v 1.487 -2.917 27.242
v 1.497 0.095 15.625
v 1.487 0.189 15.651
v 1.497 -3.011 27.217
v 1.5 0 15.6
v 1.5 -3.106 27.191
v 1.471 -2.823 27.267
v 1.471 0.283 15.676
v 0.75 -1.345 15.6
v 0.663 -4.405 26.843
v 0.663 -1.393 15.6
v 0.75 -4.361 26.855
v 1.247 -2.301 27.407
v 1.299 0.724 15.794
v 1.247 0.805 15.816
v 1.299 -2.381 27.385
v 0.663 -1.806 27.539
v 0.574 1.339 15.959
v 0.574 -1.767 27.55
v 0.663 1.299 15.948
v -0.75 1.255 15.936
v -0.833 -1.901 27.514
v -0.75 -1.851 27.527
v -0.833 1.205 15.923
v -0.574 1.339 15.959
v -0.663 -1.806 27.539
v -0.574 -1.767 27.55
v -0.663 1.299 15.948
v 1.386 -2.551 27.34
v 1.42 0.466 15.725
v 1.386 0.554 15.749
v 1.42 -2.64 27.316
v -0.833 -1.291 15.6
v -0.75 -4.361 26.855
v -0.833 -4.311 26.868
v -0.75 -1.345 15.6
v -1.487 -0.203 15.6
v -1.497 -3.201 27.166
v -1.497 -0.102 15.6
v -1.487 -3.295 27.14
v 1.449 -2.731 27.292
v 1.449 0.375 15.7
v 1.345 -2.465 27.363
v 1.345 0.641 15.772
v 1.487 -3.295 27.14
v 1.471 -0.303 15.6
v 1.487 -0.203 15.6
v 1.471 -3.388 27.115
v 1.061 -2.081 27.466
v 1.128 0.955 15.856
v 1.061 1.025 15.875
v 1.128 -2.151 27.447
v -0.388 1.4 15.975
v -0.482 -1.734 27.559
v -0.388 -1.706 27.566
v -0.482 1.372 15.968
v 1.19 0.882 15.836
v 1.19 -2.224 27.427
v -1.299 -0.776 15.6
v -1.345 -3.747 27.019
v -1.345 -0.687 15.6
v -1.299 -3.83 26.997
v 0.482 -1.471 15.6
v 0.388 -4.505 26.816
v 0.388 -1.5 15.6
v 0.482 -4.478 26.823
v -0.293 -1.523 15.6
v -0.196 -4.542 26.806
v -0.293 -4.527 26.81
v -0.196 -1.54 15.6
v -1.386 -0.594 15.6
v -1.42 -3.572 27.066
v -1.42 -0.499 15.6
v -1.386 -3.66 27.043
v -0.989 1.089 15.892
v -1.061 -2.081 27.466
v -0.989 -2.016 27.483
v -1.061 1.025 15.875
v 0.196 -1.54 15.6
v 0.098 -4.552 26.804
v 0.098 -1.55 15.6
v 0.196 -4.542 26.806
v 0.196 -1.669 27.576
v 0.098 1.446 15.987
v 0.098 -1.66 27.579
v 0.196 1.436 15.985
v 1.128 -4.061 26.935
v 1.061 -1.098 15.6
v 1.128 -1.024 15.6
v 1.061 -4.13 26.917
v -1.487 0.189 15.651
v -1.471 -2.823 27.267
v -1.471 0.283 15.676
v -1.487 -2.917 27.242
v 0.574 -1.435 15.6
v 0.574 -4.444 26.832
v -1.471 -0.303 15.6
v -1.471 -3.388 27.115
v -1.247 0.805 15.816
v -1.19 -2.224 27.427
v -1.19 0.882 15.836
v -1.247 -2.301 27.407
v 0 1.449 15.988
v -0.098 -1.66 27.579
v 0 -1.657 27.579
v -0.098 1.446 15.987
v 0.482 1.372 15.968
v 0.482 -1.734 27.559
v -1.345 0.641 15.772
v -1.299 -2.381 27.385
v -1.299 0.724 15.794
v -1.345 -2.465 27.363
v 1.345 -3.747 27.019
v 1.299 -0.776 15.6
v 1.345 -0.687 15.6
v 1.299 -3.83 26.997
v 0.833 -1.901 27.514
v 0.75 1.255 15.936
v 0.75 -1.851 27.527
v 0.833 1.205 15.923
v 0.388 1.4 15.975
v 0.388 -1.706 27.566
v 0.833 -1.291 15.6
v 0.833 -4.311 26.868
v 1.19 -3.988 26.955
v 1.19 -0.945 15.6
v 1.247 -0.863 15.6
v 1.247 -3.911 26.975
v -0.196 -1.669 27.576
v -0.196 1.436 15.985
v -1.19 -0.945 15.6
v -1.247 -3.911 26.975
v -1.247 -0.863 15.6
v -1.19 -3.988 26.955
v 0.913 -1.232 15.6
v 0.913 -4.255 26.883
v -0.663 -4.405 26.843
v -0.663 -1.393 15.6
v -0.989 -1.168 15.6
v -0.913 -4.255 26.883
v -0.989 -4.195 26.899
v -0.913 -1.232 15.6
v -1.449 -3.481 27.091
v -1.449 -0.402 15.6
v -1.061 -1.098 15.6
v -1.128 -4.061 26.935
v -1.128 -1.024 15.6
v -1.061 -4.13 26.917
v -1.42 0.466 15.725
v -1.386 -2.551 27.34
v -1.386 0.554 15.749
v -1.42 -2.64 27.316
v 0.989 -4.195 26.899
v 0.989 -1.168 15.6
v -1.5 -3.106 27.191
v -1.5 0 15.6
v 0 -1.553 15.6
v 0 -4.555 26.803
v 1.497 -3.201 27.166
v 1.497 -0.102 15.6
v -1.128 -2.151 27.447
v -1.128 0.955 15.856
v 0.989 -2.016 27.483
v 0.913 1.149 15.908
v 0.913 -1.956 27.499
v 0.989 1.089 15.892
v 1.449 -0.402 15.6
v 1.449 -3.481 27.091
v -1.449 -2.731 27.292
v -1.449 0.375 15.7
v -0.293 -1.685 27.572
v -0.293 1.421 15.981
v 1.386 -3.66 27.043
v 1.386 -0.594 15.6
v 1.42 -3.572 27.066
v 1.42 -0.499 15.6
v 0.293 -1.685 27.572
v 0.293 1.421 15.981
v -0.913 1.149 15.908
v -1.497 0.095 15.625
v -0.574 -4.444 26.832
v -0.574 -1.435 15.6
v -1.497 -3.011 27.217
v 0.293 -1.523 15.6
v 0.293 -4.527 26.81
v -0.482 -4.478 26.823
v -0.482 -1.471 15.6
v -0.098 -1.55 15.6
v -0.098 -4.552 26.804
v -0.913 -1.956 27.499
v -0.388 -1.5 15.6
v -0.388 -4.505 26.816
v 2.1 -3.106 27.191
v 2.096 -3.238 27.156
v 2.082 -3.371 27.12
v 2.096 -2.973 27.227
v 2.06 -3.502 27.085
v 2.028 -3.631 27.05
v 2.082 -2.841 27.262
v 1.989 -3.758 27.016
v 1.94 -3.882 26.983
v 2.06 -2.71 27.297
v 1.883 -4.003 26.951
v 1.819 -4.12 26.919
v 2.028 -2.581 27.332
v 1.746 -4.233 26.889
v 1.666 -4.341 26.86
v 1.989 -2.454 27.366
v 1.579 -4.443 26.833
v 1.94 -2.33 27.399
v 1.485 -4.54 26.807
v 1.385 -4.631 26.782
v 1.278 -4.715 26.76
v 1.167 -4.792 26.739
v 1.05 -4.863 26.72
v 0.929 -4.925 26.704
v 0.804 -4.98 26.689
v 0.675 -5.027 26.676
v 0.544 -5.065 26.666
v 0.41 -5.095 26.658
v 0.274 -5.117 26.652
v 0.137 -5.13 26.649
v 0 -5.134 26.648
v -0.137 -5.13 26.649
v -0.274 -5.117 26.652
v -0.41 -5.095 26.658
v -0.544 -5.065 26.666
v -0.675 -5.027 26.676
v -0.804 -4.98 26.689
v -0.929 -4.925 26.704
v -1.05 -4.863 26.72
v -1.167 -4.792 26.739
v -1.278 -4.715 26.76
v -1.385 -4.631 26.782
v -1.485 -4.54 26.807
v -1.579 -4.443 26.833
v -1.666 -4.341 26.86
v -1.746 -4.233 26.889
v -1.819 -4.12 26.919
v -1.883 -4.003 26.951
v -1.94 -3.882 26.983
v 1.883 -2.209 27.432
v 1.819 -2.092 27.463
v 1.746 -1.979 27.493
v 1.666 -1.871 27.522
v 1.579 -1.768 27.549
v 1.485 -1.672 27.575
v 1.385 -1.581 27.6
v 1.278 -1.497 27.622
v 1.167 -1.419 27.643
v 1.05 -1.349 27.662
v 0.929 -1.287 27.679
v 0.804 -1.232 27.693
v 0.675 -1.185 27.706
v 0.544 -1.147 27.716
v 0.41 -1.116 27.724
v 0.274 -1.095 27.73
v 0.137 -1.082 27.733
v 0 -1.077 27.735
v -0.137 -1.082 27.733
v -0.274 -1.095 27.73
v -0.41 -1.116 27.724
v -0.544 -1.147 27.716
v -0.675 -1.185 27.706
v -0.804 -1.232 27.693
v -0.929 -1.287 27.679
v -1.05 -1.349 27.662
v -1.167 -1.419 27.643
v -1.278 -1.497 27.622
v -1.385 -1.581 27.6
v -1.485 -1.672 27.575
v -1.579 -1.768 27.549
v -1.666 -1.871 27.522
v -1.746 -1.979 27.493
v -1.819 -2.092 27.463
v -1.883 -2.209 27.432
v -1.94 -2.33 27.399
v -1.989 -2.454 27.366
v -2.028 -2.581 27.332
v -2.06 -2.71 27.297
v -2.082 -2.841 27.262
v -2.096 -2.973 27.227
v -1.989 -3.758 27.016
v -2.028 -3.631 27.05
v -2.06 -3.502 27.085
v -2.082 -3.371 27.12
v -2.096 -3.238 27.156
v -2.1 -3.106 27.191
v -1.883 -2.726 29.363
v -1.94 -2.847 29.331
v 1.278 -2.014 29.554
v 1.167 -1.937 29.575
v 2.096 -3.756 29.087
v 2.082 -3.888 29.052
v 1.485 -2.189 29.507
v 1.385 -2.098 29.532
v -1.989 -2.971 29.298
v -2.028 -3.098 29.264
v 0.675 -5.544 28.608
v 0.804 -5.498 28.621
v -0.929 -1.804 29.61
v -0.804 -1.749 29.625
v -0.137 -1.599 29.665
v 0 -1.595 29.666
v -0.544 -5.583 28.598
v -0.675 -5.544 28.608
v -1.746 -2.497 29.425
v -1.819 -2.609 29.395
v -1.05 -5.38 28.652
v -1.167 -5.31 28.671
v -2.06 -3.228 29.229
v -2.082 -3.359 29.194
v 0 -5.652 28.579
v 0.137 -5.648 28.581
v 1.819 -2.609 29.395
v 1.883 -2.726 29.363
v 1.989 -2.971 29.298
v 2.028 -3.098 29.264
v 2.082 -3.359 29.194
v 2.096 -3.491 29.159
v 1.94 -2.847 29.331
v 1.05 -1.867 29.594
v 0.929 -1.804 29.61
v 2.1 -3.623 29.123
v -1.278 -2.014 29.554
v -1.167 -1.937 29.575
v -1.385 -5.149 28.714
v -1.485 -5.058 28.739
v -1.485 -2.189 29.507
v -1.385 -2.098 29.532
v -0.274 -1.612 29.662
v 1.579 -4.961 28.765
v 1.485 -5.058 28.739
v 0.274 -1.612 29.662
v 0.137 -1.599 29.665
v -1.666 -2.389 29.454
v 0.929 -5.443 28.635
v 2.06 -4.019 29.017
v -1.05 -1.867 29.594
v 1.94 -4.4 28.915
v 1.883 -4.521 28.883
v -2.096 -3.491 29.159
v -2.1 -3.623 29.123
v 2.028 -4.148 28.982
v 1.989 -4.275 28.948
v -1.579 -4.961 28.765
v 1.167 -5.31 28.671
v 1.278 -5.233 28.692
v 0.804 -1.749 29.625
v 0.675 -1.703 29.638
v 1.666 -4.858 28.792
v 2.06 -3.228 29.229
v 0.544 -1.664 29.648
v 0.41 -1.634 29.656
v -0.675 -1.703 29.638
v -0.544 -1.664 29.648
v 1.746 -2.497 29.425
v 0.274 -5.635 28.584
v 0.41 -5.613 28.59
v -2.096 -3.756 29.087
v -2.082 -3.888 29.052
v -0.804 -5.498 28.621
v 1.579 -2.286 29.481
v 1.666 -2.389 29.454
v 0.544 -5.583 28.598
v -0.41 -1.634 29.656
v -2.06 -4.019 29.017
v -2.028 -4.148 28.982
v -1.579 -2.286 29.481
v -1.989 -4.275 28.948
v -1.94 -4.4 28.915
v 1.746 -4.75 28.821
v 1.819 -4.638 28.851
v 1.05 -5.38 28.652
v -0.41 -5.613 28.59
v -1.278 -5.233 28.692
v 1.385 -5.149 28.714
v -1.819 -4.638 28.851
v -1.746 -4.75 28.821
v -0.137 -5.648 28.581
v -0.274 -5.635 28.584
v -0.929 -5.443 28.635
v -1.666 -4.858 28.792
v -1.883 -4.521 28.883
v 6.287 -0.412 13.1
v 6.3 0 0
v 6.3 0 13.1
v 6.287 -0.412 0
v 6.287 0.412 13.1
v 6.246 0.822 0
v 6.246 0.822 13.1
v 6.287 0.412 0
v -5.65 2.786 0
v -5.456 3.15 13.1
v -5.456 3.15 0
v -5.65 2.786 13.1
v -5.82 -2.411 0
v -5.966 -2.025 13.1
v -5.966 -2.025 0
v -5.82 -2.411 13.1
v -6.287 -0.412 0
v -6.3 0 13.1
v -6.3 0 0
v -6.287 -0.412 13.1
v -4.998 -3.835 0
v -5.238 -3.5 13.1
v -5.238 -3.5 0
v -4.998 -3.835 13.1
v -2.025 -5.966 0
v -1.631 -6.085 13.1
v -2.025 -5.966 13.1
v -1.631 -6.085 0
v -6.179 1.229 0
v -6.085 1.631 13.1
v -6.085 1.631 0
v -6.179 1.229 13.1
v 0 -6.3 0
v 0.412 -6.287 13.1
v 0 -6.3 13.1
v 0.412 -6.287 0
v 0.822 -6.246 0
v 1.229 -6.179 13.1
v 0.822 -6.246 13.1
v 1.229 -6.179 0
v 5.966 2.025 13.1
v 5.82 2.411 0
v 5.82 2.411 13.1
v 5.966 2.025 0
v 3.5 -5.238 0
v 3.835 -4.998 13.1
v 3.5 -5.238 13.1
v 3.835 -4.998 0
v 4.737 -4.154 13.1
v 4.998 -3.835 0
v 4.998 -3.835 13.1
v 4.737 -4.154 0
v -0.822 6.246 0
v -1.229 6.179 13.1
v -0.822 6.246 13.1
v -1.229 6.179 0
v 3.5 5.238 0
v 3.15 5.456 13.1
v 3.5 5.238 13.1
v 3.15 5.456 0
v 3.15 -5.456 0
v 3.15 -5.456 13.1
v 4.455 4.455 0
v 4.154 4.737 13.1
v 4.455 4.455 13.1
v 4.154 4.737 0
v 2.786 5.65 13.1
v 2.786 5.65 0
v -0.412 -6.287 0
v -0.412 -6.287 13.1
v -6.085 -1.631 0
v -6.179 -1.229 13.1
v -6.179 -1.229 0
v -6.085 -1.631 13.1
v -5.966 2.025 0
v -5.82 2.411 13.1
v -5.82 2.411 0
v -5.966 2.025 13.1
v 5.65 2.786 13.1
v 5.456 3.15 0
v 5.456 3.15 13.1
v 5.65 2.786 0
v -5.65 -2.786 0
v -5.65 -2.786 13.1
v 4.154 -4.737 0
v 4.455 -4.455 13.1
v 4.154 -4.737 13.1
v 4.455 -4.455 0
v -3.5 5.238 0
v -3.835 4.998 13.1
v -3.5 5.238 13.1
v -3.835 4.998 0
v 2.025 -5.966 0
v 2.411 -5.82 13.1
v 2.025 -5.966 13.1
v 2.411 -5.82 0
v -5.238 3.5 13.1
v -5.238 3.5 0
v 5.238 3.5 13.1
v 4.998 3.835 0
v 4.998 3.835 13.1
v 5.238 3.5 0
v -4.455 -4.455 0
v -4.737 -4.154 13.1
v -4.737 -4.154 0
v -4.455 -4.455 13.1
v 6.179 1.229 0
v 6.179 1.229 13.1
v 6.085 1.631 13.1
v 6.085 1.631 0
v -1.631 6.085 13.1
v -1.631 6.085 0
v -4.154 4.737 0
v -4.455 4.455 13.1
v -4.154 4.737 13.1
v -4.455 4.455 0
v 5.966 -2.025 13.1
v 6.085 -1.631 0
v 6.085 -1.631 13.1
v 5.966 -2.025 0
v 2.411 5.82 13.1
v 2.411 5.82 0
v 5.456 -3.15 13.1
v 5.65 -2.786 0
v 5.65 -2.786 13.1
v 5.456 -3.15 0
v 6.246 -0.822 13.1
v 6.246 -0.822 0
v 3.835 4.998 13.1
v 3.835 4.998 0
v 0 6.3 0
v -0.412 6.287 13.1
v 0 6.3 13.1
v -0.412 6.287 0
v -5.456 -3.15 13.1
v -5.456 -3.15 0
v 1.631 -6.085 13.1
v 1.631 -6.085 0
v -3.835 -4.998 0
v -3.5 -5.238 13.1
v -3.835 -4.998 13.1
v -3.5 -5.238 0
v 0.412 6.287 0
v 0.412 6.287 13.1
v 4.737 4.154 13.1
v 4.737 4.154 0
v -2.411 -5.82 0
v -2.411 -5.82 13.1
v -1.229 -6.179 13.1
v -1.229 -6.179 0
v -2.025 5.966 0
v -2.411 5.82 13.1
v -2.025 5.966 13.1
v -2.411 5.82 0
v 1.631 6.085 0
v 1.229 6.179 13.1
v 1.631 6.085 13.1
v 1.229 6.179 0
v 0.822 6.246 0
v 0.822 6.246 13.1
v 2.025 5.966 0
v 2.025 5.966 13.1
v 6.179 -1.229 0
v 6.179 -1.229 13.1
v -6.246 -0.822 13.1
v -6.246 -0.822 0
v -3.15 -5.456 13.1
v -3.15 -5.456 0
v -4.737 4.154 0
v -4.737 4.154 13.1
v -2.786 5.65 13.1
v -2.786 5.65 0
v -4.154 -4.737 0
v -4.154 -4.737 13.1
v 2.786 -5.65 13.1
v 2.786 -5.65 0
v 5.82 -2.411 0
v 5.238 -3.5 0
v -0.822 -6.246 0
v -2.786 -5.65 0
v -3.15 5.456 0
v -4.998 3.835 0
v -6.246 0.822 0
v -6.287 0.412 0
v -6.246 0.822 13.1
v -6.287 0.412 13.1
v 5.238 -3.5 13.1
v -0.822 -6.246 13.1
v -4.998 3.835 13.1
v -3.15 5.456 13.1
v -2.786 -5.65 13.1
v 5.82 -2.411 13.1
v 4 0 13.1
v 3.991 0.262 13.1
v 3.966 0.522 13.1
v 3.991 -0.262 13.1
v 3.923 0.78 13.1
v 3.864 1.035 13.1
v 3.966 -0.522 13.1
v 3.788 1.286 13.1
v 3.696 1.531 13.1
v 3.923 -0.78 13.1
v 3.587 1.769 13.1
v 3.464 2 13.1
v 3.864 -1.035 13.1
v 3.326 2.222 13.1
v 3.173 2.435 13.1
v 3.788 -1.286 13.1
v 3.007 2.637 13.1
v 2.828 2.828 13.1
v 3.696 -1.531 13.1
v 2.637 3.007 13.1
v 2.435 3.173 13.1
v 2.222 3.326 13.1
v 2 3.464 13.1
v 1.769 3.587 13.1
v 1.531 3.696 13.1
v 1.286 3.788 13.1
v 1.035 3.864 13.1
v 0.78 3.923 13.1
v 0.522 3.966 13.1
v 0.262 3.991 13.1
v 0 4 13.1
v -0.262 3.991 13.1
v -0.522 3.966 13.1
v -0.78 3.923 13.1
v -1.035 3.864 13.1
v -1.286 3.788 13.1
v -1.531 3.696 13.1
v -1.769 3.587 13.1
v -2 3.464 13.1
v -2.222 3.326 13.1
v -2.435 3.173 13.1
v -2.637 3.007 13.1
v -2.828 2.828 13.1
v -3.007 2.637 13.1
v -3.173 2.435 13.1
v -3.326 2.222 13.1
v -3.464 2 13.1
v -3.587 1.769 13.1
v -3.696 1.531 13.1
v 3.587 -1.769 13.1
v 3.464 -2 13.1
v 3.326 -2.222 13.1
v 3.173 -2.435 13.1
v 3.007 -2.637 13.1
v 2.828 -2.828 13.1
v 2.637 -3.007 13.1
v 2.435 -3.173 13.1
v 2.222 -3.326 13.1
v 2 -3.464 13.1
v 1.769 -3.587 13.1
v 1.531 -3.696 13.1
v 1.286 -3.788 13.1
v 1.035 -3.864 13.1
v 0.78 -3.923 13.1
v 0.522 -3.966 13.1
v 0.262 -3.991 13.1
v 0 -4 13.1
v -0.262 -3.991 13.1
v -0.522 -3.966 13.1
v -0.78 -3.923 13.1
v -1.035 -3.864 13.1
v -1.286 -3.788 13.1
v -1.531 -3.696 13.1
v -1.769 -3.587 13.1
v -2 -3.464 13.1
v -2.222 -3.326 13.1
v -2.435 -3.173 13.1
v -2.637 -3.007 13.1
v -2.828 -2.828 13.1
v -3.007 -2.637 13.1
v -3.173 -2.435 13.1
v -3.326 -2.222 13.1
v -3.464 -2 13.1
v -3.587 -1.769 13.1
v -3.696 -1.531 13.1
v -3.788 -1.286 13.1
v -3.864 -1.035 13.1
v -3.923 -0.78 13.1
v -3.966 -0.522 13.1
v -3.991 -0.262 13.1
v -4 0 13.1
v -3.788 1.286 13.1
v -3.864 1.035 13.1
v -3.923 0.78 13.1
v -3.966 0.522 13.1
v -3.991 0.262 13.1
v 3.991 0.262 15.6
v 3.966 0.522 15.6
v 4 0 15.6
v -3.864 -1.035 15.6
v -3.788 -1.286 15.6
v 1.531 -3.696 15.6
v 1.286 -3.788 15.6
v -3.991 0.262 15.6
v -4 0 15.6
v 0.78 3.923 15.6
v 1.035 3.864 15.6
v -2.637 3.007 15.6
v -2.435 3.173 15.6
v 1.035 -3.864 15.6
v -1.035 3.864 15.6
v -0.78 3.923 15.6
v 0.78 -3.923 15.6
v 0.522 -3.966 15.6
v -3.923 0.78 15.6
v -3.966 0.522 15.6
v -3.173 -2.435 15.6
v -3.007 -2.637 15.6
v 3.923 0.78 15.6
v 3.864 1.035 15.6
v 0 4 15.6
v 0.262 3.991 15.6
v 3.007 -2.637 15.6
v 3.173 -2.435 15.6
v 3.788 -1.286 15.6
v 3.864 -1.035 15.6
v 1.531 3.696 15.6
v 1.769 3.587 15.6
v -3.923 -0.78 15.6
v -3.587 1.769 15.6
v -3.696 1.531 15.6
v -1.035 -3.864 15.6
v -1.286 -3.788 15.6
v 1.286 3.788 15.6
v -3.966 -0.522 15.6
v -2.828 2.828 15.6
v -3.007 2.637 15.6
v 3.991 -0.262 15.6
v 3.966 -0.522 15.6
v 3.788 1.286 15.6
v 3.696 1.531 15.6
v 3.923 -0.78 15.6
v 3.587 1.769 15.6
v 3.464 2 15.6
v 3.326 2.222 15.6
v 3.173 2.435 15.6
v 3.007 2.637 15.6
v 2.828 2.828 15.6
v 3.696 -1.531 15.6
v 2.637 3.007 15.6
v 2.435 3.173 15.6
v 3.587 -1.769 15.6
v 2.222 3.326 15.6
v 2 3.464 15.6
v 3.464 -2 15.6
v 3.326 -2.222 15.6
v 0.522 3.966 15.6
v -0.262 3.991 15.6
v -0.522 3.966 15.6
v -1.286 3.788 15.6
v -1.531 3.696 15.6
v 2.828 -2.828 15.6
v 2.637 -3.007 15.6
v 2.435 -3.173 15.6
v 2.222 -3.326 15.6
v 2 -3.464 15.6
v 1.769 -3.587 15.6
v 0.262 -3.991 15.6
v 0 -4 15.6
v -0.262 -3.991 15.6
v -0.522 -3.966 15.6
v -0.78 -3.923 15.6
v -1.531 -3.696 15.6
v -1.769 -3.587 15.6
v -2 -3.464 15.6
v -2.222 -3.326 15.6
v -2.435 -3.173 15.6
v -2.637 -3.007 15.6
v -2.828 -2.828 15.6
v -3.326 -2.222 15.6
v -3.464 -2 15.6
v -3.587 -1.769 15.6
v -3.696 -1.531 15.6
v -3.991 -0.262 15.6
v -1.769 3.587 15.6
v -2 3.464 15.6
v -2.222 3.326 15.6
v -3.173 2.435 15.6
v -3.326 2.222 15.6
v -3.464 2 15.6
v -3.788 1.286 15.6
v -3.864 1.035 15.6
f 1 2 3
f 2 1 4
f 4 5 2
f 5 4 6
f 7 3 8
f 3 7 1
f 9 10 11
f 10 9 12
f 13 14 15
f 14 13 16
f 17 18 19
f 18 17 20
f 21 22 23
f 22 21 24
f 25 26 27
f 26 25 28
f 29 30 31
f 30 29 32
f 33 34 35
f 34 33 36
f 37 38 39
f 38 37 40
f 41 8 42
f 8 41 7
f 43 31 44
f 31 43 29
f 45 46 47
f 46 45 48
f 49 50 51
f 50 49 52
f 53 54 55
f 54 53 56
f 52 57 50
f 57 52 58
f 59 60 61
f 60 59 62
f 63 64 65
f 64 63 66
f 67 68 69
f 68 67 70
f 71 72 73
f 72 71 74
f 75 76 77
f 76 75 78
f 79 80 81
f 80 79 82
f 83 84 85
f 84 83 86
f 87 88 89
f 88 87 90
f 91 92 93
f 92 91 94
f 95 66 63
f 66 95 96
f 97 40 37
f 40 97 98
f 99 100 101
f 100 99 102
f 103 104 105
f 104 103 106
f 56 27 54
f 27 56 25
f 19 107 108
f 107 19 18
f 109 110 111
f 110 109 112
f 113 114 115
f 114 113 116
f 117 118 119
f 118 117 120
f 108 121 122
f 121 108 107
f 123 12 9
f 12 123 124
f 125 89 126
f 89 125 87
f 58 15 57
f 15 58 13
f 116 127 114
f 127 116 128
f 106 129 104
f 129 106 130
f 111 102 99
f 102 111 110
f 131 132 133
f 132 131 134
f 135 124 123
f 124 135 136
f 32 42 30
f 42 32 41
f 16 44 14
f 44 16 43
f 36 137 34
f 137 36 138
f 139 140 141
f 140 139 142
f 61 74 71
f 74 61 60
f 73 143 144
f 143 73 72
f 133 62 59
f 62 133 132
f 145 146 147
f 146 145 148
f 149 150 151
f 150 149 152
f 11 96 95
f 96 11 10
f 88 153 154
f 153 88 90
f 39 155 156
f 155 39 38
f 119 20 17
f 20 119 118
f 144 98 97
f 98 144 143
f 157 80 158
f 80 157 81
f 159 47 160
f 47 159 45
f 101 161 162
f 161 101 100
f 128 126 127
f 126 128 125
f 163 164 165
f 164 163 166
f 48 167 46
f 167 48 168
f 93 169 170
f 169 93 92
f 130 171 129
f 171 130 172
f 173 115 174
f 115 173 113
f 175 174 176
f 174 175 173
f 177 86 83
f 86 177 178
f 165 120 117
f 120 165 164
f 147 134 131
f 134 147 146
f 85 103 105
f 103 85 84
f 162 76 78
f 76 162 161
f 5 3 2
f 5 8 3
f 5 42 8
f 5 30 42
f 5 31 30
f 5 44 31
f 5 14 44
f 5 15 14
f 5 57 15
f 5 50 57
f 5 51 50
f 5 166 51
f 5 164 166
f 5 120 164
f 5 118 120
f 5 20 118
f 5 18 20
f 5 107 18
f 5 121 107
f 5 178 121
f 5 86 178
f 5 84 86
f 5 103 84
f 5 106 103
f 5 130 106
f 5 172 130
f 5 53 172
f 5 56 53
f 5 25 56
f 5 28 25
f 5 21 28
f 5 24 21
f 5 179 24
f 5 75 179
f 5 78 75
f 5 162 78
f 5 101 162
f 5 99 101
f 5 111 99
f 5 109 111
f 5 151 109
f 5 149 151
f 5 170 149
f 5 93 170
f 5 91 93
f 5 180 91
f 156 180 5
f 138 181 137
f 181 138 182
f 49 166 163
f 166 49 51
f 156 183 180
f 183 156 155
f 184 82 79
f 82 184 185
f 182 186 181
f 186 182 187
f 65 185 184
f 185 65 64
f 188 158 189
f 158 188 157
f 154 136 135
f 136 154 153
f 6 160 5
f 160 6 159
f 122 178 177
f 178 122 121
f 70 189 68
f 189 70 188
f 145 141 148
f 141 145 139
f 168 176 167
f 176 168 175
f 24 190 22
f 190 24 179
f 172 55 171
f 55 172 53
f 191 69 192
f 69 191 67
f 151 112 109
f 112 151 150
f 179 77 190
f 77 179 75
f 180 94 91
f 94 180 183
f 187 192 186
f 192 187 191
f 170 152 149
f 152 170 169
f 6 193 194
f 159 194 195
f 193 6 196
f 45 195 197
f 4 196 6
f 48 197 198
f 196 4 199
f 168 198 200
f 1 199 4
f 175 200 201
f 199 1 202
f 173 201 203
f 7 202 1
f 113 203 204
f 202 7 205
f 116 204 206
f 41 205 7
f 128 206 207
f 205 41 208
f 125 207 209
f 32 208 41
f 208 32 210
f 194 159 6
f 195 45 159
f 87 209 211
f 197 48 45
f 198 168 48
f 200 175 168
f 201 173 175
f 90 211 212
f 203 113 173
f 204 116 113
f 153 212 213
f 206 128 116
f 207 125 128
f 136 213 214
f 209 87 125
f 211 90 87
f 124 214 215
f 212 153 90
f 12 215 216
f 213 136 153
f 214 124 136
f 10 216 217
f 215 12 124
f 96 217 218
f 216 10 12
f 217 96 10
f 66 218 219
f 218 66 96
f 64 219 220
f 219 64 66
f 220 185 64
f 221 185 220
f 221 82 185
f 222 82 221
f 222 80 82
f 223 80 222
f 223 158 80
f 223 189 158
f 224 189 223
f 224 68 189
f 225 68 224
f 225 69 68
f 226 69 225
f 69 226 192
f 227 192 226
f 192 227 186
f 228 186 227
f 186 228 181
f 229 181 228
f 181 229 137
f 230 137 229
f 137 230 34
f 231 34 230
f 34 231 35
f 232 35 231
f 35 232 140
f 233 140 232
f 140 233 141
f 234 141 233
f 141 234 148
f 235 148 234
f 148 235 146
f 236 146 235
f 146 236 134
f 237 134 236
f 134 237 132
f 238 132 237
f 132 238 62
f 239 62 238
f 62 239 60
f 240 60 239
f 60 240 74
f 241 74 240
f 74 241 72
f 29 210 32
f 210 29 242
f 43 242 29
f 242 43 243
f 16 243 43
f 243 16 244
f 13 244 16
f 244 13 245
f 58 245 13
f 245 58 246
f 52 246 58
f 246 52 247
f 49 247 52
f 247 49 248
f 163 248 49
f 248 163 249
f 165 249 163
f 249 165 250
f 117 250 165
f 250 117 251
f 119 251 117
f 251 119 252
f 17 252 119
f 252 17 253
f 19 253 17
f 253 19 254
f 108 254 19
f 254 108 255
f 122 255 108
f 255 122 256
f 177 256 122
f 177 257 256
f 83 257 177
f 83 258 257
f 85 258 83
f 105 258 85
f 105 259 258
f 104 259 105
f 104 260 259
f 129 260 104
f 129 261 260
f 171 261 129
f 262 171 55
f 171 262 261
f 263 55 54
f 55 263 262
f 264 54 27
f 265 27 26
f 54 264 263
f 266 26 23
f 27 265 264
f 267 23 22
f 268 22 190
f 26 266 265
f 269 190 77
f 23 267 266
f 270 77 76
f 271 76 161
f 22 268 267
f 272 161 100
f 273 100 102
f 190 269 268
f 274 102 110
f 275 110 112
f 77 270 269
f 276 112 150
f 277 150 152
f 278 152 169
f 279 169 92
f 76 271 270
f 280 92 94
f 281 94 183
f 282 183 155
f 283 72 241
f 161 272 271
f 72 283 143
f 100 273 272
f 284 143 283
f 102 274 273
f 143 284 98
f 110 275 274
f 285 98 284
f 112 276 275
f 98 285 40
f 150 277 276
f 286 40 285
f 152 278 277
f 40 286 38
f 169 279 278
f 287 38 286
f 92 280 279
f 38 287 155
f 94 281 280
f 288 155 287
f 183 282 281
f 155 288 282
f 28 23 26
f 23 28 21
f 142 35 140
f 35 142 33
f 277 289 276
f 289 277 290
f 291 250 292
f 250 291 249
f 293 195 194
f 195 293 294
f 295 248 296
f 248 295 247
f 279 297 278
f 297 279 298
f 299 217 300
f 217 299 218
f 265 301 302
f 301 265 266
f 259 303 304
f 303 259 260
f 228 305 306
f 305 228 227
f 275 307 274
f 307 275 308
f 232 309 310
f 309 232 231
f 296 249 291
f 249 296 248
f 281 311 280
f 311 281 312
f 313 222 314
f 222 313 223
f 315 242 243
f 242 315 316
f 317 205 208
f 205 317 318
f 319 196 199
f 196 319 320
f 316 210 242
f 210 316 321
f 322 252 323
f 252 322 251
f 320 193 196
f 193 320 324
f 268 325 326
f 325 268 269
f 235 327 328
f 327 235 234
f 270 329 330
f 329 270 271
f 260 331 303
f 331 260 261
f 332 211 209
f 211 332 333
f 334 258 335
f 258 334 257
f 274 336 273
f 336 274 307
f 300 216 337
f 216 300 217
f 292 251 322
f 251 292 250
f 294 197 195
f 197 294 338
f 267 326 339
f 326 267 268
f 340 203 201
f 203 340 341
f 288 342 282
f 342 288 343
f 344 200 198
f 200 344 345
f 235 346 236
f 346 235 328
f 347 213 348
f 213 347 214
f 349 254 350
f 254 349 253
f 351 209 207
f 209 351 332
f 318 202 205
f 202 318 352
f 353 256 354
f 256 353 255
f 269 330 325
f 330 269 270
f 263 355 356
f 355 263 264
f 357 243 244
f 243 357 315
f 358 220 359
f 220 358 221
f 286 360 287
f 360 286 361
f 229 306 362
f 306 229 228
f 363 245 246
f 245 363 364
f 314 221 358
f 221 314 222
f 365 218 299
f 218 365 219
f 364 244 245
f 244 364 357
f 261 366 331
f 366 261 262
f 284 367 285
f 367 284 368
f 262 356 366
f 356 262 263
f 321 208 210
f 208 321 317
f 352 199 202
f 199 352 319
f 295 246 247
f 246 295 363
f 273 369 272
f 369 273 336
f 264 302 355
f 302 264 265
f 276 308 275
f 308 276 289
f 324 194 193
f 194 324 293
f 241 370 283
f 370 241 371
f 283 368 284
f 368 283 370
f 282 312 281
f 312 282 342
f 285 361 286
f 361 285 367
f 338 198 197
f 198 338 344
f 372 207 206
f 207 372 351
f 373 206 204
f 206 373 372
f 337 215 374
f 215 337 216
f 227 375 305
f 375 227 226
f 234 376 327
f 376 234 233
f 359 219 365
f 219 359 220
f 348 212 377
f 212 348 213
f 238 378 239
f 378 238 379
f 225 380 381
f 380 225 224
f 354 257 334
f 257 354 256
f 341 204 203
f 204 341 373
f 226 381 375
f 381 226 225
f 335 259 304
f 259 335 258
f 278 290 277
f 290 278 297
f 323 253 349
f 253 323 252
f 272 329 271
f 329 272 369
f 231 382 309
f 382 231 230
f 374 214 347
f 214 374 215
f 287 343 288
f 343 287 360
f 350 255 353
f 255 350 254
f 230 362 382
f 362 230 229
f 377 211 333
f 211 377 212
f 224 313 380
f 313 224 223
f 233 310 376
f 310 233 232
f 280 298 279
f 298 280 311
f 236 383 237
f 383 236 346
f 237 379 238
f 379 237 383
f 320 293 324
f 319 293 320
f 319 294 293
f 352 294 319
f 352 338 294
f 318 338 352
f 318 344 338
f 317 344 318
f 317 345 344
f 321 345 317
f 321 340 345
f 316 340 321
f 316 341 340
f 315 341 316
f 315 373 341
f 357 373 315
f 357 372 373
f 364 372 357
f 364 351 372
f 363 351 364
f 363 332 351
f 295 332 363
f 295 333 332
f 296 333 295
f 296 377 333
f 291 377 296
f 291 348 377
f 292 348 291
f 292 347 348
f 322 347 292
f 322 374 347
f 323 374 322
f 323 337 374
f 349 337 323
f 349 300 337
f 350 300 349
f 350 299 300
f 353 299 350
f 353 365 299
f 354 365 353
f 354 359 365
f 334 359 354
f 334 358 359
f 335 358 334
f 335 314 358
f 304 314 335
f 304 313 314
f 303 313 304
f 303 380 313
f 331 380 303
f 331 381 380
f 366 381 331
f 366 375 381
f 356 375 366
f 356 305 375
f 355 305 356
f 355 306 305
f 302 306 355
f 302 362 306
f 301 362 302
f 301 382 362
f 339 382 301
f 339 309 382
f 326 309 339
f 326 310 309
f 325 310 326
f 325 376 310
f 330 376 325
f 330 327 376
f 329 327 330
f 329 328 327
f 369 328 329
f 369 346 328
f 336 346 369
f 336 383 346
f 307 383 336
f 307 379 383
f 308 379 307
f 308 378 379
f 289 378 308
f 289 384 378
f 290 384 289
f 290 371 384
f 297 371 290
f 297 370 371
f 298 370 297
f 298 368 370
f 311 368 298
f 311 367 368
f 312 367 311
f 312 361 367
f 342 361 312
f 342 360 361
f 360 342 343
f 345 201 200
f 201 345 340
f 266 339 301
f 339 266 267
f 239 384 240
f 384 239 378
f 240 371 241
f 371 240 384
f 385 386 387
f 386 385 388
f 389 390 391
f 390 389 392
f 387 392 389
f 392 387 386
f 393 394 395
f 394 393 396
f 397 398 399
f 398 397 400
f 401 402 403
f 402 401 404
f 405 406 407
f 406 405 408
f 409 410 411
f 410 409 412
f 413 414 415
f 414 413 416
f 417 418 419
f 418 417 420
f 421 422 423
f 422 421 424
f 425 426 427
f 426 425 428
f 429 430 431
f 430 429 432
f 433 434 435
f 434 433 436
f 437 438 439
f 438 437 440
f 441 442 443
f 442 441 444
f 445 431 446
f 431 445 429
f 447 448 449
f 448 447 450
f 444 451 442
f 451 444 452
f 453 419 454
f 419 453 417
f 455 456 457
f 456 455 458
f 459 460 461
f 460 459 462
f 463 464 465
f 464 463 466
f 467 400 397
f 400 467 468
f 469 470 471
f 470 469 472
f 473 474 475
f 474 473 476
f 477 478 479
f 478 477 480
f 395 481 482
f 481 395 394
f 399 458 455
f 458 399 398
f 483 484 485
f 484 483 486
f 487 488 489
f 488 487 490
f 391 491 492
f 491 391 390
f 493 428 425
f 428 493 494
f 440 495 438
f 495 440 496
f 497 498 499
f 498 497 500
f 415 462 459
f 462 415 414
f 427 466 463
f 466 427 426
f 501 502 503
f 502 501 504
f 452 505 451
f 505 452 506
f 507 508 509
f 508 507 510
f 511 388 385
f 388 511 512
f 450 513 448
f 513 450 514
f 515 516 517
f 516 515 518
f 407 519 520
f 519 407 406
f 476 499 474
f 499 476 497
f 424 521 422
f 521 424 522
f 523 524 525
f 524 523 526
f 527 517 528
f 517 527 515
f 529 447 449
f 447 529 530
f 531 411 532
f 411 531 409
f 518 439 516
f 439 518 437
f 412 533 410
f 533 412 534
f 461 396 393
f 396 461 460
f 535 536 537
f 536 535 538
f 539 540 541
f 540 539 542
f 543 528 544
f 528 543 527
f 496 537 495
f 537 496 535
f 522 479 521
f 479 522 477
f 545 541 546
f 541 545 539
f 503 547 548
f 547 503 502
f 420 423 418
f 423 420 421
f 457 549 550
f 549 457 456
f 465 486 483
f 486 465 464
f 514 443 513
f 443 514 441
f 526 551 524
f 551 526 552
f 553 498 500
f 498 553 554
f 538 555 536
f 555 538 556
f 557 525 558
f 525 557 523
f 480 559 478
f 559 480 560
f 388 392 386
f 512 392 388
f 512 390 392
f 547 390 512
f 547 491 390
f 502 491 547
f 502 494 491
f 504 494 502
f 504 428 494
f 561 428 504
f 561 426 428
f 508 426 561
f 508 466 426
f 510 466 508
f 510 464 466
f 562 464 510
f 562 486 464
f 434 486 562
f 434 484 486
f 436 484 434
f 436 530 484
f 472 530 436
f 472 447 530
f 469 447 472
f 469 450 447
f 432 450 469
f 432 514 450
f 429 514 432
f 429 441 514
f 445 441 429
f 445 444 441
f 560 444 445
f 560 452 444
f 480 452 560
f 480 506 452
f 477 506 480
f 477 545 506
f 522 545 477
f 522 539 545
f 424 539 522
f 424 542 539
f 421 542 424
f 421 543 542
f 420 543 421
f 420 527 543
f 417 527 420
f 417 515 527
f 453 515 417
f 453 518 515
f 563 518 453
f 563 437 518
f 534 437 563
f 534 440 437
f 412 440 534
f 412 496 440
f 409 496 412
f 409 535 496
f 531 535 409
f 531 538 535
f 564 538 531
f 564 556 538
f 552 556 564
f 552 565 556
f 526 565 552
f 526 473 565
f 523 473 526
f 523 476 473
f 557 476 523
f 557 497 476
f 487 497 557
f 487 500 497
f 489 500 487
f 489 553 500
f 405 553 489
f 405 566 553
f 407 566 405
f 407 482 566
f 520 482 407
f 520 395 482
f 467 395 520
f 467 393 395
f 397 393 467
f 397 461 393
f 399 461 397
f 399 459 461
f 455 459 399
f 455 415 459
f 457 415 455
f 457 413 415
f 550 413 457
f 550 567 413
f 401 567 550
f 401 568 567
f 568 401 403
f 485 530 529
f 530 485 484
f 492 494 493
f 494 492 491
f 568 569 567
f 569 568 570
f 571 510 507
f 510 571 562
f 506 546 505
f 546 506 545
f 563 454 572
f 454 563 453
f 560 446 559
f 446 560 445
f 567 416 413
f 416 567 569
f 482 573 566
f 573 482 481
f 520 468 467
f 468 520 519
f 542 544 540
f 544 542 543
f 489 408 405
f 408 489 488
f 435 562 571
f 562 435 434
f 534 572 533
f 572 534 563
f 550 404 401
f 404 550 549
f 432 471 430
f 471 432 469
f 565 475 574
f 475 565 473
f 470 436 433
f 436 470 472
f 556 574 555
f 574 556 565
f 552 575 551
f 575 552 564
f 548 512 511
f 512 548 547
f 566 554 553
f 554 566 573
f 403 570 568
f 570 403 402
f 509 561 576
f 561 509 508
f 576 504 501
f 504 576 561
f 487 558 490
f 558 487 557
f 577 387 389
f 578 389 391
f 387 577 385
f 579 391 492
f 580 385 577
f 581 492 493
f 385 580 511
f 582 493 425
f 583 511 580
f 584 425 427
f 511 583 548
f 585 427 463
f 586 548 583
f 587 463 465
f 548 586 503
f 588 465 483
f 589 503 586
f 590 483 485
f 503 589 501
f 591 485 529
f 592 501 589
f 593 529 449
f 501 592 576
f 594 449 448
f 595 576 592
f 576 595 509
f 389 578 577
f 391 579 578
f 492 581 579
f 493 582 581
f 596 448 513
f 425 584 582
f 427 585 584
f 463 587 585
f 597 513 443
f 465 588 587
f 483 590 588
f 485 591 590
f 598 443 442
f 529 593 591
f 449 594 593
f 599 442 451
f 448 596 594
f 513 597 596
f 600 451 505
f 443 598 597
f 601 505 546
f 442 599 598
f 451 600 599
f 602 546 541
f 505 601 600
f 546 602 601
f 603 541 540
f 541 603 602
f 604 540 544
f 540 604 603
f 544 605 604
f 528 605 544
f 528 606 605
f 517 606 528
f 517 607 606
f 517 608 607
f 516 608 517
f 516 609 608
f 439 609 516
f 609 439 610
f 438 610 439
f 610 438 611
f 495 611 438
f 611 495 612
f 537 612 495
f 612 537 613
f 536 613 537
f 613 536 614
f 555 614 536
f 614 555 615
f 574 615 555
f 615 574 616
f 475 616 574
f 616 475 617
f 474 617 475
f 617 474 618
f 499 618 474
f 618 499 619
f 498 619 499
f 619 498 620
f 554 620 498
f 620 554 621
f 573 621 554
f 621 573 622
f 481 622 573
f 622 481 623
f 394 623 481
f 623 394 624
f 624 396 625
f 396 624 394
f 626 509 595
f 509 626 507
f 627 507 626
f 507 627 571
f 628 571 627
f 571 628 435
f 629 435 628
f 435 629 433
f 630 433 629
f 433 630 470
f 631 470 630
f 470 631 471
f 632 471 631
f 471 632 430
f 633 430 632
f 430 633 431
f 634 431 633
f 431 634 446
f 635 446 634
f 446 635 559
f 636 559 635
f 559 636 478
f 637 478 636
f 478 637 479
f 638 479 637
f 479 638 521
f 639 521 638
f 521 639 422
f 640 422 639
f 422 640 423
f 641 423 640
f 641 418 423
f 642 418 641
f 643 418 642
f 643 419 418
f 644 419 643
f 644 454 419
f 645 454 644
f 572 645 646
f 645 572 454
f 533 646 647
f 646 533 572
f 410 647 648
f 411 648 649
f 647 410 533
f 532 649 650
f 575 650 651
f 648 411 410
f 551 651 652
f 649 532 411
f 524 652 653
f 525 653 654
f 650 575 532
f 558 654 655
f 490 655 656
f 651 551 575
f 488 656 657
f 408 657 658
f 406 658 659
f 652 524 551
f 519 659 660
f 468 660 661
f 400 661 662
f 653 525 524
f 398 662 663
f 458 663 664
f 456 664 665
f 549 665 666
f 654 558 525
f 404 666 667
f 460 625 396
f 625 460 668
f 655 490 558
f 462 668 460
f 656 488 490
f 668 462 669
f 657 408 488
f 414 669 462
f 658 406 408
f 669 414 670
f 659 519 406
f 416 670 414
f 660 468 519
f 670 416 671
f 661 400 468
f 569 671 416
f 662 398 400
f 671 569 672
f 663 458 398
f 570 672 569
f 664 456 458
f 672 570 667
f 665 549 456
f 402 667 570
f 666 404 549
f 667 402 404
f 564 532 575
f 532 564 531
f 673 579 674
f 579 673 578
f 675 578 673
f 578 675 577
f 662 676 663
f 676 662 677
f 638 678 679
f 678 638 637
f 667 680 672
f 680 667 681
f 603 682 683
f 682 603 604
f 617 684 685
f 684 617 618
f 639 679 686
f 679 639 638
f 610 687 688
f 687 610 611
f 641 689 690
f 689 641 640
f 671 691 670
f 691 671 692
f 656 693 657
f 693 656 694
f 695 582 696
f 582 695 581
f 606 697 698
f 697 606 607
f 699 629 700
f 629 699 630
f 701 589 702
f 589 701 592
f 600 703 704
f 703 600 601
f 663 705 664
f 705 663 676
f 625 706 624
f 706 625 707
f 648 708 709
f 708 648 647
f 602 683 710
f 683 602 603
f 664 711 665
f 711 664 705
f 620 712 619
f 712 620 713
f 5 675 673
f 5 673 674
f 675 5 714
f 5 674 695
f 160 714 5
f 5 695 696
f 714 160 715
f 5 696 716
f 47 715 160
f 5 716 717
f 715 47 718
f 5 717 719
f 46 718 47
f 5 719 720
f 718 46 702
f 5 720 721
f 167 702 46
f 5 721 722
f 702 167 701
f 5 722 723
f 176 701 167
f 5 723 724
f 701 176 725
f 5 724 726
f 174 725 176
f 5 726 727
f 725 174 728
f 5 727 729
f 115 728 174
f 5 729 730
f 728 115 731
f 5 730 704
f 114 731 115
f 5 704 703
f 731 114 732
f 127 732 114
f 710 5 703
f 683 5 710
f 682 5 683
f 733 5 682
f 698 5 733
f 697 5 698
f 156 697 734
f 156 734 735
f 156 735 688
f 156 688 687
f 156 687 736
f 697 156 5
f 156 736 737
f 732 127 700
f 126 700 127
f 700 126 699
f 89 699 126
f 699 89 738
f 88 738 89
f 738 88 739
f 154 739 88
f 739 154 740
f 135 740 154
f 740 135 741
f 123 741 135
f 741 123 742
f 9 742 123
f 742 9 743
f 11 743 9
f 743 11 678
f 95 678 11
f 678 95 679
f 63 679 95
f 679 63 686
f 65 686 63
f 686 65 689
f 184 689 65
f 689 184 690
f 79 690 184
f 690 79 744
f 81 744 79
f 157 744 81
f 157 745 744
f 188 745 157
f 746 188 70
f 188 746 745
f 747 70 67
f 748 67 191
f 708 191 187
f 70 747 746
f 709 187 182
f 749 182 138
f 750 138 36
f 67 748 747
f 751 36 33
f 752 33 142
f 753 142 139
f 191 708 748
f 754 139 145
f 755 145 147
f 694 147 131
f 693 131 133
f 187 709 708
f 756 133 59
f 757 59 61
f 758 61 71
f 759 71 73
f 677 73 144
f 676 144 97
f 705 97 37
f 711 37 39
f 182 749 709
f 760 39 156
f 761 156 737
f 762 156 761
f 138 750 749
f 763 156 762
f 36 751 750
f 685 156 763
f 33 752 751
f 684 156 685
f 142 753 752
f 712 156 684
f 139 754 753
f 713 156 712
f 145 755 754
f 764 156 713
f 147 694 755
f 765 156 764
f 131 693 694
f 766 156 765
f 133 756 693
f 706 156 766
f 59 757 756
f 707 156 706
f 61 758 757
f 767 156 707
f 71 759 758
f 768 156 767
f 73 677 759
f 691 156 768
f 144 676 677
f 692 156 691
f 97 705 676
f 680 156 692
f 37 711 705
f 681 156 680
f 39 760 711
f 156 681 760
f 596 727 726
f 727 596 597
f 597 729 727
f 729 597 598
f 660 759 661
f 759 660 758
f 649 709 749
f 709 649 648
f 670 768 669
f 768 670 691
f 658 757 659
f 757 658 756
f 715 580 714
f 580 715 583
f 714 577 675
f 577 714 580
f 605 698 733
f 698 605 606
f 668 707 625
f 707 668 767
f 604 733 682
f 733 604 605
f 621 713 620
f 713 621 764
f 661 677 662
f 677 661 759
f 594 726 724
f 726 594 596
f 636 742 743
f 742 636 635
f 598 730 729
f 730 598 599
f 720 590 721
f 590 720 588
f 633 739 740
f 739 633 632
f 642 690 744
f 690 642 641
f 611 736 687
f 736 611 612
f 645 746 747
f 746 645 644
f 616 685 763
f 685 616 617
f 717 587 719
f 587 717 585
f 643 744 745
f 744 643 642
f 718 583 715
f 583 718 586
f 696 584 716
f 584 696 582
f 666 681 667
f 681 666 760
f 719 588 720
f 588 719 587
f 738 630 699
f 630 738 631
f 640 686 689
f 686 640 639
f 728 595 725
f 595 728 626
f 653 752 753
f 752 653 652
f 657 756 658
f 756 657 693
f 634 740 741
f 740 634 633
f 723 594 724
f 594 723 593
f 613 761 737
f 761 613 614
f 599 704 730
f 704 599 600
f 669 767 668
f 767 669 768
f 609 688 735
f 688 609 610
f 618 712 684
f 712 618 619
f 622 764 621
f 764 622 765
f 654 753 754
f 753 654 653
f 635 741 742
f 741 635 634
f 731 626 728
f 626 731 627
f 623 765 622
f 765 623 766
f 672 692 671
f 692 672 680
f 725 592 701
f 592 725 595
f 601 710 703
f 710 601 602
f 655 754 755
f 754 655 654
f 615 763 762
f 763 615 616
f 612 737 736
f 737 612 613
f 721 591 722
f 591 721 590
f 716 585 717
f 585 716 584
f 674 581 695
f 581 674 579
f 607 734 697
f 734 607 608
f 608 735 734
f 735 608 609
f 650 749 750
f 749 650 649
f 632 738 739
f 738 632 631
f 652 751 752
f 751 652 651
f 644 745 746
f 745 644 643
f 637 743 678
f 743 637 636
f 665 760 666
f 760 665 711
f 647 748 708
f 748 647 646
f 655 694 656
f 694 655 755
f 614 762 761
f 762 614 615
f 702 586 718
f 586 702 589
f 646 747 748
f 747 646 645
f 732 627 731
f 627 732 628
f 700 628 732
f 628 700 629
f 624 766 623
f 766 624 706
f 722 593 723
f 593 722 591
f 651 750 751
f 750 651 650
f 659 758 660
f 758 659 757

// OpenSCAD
$fn = 96;

// Dimensions (mm)
body_d = 12.6;
body_h = 13.1;

// Simple toggle switch approximation
// - Cylindrical body
// - Small top bushing
// - Toggle lever

bushing_d = 8.0;
bushing_h = 2.5;

lever_d = 3.0;
lever_h = 12.0;

lever_tip_d = 4.2;
lever_tip_h = 2.0;

module toggle_switch() {
    union() {
        // Main body
        cylinder(d = body_d, h = body_h);

        // Top bushing
        translate([0, 0, body_h])
            cylinder(d = bushing_d, h = bushing_h);

        // Lever (slightly tilted)
        translate([0, 0, body_h + bushing_h])
            rotate([15, 0, 0])
                union() {
                    cylinder(d = lever_d, h = lever_h);
                    translate([0, 0, lever_h])
                        cylinder(d1 = lever_tip_d, d2 = lever_tip_d, h = lever_tip_h);
                }
    }
}

toggle_switch();
